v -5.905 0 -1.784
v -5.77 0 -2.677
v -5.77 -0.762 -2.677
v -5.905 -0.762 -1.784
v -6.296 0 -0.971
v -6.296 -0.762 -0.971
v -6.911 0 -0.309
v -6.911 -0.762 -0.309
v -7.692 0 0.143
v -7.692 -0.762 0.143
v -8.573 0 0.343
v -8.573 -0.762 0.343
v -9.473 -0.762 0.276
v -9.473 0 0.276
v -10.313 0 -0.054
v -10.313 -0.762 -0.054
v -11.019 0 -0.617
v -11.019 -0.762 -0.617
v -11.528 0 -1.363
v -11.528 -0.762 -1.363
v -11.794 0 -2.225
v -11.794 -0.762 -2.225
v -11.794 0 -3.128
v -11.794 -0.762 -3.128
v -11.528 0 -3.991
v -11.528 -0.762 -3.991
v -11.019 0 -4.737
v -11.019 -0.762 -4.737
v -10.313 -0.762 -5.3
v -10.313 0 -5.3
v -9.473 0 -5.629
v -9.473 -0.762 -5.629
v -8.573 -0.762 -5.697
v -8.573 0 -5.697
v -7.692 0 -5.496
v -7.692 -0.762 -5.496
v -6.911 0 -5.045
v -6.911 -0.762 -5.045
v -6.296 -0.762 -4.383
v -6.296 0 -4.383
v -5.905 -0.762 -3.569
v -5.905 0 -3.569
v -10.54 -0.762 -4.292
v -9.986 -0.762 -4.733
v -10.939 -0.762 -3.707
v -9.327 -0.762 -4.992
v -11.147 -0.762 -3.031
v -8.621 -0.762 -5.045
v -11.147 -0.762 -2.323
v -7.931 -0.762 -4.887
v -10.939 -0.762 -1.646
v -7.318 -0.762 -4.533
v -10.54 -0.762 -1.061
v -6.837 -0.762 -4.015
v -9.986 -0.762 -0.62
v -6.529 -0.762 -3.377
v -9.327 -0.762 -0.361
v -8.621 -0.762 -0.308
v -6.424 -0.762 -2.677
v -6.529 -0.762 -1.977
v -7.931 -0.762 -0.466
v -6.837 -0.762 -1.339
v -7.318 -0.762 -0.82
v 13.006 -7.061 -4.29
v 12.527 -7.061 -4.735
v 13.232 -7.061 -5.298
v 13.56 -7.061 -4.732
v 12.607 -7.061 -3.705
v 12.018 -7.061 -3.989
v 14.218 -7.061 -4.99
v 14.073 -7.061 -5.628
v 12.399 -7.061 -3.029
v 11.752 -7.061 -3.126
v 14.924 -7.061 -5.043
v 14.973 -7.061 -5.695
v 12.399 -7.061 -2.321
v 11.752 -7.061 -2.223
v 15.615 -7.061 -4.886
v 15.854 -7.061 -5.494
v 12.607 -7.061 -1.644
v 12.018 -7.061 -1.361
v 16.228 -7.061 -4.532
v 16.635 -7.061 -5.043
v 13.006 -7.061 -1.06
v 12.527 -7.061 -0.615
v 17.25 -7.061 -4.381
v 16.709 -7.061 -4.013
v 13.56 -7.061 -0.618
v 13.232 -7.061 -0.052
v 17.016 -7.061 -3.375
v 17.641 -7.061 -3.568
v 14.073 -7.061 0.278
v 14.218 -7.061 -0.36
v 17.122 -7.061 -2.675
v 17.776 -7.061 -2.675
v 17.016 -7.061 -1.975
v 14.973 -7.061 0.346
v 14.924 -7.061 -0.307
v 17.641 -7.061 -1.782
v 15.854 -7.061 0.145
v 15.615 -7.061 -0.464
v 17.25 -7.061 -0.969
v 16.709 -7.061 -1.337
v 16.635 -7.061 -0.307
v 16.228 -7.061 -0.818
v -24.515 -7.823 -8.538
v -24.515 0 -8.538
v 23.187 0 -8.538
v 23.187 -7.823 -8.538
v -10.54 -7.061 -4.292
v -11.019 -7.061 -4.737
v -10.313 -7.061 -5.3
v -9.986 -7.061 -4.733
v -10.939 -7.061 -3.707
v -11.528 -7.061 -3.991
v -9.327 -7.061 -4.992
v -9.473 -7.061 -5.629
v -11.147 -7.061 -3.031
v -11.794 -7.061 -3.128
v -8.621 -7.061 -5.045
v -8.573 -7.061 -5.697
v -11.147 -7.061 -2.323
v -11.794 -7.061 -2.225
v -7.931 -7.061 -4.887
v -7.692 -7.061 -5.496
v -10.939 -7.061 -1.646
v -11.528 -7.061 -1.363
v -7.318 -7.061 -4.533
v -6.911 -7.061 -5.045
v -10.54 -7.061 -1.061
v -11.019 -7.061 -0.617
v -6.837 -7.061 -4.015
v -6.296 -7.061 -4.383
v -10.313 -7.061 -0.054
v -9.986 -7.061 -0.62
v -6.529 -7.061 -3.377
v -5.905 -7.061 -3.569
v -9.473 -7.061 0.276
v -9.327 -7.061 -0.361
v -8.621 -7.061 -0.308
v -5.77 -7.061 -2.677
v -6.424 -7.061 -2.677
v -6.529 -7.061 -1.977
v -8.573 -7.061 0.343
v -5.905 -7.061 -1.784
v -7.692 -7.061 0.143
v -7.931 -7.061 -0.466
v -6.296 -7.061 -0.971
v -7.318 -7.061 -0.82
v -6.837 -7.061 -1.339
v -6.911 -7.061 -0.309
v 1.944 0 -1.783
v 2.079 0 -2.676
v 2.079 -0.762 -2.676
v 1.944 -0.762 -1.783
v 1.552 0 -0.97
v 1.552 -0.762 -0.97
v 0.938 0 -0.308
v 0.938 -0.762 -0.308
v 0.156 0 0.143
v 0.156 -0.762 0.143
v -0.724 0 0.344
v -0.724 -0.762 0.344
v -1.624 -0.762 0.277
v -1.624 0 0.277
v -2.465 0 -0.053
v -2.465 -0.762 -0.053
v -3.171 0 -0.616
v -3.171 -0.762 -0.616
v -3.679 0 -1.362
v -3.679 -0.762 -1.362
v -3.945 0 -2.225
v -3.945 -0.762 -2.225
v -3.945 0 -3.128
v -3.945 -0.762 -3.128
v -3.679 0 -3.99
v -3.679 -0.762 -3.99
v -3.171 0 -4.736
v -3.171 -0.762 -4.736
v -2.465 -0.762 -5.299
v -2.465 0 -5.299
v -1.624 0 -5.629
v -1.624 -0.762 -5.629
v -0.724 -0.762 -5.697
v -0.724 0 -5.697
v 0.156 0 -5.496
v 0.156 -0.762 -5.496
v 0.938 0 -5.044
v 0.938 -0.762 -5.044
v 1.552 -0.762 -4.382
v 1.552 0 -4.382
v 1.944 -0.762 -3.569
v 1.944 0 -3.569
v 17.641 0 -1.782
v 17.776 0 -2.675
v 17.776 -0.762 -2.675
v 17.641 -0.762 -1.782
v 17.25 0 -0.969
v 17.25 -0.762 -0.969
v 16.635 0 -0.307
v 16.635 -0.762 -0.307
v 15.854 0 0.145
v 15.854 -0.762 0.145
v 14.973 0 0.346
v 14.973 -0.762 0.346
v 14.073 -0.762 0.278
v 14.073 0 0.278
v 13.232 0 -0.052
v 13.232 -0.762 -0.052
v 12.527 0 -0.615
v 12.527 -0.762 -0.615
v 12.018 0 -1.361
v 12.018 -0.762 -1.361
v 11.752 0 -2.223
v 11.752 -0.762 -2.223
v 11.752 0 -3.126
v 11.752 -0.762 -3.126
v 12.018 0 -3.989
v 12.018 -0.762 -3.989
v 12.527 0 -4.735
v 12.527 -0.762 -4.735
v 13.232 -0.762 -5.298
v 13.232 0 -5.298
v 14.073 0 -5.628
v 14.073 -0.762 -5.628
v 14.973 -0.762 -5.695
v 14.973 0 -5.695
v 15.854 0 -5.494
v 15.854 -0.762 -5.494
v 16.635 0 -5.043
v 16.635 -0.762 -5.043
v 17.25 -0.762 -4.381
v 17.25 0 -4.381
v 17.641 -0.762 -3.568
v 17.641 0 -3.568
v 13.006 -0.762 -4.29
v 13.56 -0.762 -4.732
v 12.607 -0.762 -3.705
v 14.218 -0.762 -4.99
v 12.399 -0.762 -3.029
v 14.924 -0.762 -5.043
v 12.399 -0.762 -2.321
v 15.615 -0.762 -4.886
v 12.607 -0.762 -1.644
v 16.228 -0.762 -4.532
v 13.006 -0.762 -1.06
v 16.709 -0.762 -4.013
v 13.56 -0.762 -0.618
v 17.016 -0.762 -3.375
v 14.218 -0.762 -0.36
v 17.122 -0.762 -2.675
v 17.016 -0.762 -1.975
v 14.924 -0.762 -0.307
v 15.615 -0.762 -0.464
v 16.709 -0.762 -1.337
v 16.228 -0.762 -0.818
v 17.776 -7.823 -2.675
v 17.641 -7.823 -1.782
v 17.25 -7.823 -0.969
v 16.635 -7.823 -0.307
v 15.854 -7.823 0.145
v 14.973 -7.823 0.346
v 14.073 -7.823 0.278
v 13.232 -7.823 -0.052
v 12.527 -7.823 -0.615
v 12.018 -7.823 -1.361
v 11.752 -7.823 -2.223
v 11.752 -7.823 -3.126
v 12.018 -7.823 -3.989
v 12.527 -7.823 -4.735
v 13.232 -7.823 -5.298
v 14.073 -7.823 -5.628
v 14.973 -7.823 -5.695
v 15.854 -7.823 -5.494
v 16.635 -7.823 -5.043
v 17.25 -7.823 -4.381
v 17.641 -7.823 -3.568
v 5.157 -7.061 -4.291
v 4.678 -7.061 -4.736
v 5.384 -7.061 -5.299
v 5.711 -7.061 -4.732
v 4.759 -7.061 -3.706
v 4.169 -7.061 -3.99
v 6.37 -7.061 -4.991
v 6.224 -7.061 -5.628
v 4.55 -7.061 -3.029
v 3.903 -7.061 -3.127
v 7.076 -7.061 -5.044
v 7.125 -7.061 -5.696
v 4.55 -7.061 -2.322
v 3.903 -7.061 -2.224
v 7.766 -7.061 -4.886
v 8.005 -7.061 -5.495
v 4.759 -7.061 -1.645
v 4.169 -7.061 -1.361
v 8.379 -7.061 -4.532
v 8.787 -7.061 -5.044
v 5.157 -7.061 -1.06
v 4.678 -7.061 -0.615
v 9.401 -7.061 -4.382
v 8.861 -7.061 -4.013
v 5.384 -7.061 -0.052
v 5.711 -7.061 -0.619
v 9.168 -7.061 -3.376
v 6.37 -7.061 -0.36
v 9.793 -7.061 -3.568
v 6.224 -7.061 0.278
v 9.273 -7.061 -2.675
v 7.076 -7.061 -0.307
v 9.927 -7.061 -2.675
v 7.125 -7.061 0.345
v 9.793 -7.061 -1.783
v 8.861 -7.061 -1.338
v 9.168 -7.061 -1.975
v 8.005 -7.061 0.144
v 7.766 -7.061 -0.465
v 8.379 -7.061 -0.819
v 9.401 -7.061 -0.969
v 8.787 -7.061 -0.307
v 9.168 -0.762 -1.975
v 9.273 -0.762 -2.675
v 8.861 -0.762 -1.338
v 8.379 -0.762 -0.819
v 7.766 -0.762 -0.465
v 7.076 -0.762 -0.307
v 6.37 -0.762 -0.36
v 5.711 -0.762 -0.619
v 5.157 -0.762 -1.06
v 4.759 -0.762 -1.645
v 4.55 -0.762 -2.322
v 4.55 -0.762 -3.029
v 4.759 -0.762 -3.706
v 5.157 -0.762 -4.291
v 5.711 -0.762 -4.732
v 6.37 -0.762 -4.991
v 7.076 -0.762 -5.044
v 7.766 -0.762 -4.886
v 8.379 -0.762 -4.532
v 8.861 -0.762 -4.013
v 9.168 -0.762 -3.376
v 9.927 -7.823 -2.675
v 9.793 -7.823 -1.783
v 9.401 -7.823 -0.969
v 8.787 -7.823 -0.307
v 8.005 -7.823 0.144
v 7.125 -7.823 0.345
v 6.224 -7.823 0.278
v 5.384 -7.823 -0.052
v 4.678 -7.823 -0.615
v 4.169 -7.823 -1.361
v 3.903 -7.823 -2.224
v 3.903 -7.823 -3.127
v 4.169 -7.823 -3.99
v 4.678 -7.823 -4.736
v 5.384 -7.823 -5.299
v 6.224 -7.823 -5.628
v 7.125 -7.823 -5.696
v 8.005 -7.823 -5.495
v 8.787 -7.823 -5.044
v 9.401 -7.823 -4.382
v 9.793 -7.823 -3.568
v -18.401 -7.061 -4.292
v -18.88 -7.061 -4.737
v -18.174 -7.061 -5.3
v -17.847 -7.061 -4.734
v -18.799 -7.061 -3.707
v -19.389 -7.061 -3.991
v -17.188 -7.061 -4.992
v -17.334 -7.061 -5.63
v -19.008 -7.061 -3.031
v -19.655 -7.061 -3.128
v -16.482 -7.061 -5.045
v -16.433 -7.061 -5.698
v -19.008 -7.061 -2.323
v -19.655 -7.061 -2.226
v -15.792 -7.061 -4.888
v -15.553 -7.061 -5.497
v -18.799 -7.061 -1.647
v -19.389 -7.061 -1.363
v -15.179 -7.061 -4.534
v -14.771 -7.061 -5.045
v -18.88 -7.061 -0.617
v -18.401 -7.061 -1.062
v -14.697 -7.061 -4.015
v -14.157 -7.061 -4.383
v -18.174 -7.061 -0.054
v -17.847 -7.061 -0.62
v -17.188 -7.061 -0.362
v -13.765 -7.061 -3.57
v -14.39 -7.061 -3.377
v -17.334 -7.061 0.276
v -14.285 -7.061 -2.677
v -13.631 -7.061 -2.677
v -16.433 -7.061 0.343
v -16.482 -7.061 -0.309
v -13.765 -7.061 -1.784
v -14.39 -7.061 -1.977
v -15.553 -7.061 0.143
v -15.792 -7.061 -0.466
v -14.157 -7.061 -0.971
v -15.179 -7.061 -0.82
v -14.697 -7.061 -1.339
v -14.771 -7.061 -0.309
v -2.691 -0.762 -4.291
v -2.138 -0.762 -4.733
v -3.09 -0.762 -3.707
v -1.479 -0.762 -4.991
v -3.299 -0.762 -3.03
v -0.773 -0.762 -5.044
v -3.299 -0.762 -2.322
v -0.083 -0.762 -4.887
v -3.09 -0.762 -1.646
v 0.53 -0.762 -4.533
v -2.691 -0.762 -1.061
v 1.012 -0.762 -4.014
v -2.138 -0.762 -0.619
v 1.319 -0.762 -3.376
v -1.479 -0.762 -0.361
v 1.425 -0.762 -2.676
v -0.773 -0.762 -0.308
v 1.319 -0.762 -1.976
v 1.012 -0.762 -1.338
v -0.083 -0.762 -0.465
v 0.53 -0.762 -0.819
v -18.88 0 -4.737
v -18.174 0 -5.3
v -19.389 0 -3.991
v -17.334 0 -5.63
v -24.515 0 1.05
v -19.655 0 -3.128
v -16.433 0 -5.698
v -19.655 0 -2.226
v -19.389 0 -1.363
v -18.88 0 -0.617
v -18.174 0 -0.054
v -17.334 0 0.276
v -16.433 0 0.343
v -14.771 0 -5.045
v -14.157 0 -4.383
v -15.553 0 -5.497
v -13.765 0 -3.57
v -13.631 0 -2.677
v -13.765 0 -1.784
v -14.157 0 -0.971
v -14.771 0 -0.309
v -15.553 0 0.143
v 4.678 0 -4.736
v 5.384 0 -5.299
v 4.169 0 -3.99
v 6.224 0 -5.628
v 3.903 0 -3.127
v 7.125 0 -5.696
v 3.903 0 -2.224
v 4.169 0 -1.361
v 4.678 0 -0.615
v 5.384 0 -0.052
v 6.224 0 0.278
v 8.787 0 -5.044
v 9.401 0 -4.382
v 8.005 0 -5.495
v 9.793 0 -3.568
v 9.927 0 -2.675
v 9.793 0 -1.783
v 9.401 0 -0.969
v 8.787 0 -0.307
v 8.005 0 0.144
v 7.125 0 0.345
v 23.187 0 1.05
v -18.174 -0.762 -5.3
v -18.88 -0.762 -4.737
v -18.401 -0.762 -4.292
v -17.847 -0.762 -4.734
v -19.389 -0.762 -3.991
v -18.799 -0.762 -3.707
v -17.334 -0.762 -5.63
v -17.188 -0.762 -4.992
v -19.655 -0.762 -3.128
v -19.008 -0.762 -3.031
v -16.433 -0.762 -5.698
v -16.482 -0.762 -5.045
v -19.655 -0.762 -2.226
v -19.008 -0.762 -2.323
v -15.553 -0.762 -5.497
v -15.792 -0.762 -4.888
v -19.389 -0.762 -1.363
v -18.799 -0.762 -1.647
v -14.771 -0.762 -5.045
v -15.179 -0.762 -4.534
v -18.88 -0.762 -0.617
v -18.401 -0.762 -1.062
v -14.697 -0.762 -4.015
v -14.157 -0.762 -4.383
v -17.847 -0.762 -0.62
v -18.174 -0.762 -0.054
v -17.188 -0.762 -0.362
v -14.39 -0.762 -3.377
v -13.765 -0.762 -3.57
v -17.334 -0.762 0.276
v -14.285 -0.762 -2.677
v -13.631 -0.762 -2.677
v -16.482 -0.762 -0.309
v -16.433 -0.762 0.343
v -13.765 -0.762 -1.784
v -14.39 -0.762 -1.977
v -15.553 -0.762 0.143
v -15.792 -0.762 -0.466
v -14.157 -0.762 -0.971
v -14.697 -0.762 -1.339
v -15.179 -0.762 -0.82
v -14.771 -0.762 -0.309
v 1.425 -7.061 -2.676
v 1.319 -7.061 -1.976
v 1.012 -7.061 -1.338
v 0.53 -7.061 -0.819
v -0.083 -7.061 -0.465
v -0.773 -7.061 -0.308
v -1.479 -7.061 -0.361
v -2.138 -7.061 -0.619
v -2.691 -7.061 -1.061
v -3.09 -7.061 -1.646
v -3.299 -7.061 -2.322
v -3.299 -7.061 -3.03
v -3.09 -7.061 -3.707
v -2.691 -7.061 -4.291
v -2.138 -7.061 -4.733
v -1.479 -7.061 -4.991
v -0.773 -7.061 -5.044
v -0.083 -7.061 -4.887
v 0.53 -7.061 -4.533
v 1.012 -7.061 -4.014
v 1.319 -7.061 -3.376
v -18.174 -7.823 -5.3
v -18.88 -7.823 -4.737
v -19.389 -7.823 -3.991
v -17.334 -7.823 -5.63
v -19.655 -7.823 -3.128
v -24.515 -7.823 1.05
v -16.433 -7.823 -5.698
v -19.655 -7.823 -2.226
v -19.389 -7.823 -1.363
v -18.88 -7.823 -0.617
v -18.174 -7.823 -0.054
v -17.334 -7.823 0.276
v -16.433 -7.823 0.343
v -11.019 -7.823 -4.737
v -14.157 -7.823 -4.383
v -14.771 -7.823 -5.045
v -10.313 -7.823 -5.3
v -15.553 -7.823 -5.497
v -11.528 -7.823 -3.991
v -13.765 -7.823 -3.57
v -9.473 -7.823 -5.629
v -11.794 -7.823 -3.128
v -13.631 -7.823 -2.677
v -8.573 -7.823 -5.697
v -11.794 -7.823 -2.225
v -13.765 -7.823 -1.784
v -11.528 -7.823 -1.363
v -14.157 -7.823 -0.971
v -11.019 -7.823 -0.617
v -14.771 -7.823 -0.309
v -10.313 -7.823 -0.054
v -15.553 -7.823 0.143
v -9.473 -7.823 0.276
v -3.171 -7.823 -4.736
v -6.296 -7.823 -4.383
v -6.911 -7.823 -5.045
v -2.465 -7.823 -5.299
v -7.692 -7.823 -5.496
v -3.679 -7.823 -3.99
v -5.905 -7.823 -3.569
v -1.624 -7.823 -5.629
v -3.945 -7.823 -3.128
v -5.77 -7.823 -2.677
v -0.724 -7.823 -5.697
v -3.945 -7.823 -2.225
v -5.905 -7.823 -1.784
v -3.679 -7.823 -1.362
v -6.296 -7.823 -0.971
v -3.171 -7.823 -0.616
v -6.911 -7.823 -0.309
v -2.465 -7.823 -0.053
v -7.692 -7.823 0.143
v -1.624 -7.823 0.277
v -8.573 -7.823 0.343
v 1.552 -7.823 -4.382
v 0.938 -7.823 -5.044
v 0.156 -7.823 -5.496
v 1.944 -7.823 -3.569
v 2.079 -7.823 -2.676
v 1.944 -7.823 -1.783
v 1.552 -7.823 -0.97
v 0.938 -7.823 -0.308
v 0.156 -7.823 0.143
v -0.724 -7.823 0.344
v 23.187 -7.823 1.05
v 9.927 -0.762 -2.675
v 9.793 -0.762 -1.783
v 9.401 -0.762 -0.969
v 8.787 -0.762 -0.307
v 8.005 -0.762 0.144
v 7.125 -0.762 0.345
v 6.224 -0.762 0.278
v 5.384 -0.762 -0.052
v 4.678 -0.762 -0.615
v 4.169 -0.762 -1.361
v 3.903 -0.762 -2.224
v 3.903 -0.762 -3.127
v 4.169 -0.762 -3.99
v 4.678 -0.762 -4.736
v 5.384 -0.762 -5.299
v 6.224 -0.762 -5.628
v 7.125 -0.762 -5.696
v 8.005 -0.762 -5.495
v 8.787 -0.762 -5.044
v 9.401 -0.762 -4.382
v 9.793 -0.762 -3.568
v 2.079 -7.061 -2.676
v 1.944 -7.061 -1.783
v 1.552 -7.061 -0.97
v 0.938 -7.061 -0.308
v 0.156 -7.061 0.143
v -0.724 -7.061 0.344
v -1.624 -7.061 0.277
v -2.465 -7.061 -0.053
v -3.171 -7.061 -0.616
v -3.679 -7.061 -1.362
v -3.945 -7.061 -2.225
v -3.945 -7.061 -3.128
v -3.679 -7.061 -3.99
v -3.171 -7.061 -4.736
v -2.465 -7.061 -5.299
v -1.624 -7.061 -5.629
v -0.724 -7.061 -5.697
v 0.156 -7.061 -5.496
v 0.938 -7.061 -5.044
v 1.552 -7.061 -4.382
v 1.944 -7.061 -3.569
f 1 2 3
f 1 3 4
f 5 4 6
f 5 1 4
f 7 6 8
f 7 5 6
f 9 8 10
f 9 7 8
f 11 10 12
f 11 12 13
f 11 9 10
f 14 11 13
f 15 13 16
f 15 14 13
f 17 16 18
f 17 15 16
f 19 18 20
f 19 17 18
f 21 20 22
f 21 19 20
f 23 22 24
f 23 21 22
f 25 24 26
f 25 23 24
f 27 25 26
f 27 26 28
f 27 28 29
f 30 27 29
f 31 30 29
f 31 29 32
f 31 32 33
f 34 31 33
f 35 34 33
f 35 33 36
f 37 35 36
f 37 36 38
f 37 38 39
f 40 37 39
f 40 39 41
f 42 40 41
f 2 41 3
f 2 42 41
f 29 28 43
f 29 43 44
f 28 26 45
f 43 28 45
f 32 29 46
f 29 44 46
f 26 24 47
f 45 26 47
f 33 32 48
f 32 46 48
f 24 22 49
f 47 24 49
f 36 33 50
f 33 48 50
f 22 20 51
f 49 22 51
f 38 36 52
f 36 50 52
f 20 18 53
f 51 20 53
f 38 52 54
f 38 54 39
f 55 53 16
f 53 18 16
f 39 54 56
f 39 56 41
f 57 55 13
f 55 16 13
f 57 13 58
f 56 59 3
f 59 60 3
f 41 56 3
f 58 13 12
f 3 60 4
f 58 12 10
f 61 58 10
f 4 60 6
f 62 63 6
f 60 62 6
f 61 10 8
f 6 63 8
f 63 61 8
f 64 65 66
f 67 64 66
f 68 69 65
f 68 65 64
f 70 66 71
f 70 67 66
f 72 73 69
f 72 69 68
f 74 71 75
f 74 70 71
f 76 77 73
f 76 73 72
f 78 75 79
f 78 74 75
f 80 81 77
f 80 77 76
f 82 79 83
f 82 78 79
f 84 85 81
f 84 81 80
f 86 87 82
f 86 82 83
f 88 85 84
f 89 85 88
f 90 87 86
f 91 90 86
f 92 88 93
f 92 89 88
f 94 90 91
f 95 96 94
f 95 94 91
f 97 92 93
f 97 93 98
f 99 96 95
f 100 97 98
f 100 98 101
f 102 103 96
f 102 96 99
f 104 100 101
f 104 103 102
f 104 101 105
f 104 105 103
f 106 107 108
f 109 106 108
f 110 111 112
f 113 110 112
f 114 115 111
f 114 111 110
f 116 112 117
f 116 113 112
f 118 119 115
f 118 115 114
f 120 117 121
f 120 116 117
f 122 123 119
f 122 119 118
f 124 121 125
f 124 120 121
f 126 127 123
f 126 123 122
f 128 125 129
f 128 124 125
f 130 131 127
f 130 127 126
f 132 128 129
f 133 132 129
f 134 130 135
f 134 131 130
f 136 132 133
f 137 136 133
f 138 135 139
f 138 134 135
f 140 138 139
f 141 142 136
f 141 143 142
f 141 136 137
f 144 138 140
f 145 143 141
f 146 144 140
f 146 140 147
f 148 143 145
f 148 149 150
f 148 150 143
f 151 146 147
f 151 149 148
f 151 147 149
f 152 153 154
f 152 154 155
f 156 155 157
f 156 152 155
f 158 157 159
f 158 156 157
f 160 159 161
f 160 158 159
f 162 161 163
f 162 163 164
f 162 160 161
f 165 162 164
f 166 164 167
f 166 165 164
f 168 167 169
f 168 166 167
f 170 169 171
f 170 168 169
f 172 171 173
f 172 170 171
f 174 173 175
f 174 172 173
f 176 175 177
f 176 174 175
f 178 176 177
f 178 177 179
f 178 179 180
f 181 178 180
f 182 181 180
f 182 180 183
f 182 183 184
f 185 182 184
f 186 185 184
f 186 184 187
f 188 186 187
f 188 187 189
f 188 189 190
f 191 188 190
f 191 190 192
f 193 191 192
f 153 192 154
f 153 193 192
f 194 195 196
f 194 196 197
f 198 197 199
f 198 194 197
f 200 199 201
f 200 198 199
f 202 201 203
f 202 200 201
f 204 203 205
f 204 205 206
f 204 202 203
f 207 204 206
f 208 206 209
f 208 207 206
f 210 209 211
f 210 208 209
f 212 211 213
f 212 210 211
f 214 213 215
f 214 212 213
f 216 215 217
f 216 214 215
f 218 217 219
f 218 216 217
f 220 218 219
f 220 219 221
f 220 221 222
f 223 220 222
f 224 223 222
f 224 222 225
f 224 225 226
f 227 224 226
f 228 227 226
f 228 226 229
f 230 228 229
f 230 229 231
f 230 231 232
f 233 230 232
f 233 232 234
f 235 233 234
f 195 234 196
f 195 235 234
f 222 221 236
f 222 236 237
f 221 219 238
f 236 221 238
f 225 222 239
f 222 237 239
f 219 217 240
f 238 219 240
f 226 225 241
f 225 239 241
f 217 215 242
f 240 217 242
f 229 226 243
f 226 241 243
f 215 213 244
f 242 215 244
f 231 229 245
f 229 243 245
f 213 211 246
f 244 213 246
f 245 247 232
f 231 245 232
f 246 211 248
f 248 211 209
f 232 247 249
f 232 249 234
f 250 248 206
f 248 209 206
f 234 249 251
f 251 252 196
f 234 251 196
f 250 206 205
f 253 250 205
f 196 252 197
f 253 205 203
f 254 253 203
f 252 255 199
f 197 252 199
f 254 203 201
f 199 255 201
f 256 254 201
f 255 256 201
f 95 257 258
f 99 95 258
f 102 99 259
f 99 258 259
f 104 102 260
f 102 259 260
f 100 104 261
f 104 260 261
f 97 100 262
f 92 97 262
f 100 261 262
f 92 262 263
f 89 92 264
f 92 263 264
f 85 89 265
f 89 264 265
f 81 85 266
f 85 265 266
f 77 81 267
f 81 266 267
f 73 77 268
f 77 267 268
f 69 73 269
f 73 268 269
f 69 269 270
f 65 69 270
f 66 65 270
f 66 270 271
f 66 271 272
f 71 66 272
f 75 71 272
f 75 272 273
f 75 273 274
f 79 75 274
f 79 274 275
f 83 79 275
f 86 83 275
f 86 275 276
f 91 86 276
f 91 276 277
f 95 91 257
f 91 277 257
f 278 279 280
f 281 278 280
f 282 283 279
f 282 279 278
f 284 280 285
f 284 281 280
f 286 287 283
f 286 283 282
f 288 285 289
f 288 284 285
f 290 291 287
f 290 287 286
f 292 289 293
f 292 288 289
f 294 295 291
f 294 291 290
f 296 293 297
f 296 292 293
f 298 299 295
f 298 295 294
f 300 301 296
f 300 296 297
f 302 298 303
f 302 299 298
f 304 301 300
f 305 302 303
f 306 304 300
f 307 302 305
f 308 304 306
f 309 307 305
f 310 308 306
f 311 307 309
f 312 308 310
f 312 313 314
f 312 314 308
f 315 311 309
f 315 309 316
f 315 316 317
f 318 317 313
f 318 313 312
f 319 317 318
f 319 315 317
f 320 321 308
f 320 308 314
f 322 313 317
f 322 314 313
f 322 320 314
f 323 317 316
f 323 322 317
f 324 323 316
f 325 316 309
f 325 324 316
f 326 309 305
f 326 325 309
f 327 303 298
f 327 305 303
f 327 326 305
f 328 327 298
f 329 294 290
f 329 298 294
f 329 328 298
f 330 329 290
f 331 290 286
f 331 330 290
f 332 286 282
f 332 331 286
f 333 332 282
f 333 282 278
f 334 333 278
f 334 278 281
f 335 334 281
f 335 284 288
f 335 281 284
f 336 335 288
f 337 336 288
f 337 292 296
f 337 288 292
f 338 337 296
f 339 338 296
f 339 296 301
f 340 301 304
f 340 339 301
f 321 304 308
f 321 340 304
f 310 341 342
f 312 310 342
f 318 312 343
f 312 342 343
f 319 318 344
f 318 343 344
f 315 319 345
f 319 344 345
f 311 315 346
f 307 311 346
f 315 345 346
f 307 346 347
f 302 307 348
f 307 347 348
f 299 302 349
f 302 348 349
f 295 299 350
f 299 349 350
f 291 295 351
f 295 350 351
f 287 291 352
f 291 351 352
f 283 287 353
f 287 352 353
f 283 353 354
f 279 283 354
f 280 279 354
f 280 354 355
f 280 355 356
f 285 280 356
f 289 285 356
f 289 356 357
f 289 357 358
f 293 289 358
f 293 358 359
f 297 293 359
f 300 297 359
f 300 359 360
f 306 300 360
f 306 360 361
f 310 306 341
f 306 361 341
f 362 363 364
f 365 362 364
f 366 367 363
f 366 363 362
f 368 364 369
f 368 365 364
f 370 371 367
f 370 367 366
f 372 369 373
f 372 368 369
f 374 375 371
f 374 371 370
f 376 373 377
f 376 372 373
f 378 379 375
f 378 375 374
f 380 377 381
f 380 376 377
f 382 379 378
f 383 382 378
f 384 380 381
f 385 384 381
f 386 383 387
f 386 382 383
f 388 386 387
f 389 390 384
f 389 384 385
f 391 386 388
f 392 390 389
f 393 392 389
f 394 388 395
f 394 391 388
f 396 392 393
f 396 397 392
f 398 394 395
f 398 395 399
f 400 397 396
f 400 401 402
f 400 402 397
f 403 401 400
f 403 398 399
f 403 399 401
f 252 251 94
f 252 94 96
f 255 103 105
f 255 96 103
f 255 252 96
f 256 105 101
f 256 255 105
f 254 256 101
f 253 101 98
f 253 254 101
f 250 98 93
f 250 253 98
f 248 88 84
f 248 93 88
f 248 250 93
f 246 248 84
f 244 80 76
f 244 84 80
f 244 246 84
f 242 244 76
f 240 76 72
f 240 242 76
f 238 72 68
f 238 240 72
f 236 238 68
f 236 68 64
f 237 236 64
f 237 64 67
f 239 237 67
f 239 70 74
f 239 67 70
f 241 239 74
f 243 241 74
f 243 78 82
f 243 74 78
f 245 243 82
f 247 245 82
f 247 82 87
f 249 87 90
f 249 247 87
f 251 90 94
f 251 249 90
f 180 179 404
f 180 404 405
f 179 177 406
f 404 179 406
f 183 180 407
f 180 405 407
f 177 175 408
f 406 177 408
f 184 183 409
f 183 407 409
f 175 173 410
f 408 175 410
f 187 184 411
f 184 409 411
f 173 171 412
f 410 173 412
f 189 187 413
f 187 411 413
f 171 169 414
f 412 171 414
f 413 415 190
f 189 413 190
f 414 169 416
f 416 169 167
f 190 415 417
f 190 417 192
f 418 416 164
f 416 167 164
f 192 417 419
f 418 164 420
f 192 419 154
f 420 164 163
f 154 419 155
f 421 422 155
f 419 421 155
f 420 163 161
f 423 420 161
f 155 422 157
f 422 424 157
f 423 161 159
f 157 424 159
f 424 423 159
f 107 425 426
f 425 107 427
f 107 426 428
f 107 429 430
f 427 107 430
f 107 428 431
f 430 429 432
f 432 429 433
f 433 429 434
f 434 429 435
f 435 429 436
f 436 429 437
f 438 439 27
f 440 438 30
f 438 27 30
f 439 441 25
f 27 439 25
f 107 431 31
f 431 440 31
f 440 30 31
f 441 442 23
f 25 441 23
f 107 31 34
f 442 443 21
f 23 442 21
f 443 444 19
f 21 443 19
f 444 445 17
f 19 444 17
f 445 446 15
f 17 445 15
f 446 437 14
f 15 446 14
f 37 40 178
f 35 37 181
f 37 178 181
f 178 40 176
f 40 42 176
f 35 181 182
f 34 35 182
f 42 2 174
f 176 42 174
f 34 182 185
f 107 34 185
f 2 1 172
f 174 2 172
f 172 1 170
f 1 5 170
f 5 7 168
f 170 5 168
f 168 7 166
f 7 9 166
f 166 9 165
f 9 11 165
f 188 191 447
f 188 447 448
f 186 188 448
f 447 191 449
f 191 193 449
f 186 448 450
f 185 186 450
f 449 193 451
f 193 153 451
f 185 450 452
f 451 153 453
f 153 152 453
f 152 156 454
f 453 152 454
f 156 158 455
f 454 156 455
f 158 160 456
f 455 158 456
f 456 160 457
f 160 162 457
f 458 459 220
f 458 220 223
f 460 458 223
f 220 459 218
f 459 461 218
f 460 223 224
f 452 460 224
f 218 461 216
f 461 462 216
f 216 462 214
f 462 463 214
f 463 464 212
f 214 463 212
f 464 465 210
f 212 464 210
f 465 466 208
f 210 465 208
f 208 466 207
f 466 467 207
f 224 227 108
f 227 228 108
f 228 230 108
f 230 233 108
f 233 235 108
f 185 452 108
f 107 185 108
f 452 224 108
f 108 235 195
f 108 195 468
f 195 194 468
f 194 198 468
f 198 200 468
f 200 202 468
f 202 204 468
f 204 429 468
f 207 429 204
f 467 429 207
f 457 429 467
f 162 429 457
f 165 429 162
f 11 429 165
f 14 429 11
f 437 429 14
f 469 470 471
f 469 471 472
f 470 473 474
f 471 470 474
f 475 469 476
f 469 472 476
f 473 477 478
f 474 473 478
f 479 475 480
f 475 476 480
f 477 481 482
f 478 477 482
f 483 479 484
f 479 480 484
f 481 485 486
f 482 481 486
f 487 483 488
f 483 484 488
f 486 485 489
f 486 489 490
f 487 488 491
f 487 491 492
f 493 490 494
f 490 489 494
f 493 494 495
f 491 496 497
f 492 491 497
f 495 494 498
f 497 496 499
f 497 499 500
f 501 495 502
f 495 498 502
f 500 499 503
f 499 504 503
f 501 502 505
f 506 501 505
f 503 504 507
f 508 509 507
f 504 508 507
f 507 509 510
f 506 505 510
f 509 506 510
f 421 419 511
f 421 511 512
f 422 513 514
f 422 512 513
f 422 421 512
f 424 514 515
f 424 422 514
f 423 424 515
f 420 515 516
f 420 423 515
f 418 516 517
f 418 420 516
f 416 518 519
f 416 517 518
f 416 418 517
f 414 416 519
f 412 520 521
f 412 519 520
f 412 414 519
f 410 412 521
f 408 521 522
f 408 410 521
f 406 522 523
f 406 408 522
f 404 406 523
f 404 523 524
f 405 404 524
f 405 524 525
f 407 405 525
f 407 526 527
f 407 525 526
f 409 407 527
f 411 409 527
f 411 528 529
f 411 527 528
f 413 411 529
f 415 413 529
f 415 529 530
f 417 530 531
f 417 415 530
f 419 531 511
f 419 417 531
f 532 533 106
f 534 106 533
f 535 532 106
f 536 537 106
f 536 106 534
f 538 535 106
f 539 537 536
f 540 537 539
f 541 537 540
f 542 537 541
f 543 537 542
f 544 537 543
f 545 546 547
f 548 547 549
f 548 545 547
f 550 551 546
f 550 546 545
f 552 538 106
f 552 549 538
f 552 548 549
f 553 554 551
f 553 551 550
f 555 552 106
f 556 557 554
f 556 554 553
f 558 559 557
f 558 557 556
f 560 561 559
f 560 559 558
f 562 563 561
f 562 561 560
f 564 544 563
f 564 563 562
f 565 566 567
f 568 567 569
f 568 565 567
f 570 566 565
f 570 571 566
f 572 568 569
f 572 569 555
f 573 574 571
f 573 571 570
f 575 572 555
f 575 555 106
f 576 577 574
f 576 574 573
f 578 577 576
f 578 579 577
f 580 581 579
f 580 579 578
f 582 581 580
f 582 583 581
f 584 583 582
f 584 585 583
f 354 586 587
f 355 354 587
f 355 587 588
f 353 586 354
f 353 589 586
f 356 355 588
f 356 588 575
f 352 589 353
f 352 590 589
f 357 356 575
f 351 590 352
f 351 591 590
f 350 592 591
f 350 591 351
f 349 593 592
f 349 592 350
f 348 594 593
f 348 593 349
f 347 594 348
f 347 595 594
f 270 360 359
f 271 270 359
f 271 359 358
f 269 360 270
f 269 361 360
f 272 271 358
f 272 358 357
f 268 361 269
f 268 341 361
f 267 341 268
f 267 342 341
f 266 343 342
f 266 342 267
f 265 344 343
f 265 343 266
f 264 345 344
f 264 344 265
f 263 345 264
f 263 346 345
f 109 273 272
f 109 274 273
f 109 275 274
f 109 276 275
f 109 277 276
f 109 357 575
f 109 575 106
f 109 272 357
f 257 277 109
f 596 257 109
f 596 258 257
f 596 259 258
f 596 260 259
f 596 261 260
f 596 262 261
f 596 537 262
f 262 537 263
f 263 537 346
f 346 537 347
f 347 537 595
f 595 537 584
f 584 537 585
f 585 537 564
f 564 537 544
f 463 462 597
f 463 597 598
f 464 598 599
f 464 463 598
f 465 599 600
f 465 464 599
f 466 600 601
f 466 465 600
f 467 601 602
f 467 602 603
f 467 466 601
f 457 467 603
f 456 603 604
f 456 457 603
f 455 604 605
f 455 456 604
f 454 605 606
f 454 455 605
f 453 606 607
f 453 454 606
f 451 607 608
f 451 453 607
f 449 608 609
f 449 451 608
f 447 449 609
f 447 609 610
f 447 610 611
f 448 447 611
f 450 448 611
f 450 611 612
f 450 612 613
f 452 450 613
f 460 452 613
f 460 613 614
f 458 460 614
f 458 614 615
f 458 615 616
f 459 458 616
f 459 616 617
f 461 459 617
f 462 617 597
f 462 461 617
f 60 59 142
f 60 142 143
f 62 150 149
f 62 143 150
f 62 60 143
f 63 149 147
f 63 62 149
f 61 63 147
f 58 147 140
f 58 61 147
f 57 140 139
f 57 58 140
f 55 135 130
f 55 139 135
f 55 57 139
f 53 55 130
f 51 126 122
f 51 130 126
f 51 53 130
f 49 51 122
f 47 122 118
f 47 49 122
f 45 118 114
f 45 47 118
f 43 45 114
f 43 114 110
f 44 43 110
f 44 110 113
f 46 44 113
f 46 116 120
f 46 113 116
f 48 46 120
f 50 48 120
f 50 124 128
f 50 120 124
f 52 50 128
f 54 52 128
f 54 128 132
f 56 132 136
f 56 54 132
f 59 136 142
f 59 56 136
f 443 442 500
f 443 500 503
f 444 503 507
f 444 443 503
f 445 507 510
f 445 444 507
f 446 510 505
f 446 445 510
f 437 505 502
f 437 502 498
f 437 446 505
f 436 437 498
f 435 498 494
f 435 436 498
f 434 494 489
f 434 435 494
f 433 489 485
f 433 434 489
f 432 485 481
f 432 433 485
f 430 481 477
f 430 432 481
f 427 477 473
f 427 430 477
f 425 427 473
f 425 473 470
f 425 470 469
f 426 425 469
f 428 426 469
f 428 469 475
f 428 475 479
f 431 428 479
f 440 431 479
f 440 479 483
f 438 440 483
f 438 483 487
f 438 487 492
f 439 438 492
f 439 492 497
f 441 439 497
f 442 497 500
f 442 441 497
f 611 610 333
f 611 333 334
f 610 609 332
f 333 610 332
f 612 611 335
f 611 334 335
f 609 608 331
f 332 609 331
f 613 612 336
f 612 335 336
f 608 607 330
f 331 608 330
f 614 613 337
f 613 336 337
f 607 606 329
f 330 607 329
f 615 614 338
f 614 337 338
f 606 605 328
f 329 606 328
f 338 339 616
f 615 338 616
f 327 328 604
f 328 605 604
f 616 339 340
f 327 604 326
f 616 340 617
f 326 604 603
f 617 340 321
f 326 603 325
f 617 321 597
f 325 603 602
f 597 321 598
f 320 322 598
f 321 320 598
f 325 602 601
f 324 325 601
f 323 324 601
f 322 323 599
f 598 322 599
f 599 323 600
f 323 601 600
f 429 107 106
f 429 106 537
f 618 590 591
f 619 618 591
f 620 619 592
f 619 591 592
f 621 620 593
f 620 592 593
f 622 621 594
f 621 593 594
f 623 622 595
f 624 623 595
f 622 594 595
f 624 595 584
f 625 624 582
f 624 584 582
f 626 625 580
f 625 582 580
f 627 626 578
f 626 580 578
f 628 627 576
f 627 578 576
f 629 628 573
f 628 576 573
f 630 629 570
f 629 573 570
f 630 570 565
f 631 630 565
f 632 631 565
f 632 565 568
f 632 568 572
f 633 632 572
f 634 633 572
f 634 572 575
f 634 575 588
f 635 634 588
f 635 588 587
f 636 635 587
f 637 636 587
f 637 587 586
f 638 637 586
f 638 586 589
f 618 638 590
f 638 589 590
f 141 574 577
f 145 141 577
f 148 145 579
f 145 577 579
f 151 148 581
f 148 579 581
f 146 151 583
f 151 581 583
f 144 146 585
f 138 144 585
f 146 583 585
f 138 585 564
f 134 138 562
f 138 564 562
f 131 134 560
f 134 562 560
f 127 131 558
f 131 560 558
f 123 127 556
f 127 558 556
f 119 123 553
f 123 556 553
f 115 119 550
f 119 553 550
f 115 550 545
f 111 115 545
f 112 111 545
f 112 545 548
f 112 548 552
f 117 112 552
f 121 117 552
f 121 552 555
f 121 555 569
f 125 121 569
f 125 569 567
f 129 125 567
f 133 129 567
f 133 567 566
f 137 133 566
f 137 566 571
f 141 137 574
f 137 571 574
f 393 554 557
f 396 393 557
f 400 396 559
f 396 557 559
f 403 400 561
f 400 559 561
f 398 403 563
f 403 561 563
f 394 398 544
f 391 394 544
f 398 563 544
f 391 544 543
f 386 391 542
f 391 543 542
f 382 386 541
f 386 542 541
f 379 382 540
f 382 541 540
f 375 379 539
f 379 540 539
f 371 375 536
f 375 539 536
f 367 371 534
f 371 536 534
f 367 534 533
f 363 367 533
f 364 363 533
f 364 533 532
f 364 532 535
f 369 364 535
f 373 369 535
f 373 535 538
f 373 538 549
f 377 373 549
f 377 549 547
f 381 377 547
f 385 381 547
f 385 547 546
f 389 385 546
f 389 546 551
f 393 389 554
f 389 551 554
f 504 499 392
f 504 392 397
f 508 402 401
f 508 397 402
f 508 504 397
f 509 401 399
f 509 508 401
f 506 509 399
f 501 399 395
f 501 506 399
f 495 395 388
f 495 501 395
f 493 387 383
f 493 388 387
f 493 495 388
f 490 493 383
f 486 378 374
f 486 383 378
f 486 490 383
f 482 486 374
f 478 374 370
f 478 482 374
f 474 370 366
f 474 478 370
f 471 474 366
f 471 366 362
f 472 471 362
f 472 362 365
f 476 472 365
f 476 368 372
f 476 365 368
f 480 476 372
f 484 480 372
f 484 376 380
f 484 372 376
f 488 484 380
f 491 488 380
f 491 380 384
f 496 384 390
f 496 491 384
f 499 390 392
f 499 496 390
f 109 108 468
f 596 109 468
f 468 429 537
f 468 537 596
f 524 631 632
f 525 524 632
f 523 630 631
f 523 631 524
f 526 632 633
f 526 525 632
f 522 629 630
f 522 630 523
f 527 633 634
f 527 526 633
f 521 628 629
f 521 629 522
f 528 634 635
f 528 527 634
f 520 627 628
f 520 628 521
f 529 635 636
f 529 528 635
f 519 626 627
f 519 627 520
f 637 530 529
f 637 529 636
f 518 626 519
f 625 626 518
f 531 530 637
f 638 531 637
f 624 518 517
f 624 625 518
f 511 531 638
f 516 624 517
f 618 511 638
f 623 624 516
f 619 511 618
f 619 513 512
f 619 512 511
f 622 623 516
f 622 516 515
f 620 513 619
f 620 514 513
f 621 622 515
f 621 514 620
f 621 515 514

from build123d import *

# Parameters (mm, degrees)
F0_W     = 47.7012
F0_H     = 9.5885
F1_DEPTH = 7.8232
F3_R     = 2.3749
F4_DEPTH = 8.12476
F5_R     = 3.02895
F5_R_2   = 3.028652
F6_DEPTH = 0.762
F7_R     = 3.02895
F7_R_2   = 3.028652
F8_DEPTH = 0.762


with BuildPart() as f1:
    # F0 (on Front) → F1 (new body)
    with BuildSketch(Plane.XZ):
        with Locations((-0.66396, -3.743826)):
            Rectangle(F0_W, F0_H)
    extrude(amount=F1_DEPTH)

    # F3 (on Front) → F4 (cut)
    with BuildSketch(Plane.XZ):
        with Locations((14.746952, -2.674865)):
            Circle(F3_R)
        with Locations((6.898352, -2.675486)):
            Circle(F3_R)
        with Locations((-0.950248, -2.676107)):
            Circle(F3_R)
        with Locations((-8.798848, -2.676728)):
            Circle(F3_R)
        with Locations((-16.65961, -2.677026)):
            Circle(F3_R)
    extrude(amount=F4_DEPTH, mode=Mode.SUBTRACT)

    # F5 (on Front) → F6 (cut)
    with BuildSketch(Plane.XZ):
        with Locations((14.746952, -2.674865)):
            Circle(F5_R)
        with Locations((6.898352, -2.675486)):
            Circle(F5_R)
        with Locations((-0.950248, -2.676107)):
            Circle(F5_R)
        with Locations((-8.798848, -2.676728)):
            Circle(F5_R_2)
        with Locations((-16.65961, -2.677026)):
            Circle(F5_R)
    extrude(amount=F6_DEPTH, mode=Mode.SUBTRACT)

    # F7 (on face) → F8 (cut)
    with BuildSketch(Plane.XZ.offset(7.8232)):
        with Locations((14.746952, -2.674865)):
            Circle(F7_R)
        with Locations((6.898352, -2.675486)):
            Circle(F7_R)
        with Locations((-0.950248, -2.676107)):
            Circle(F7_R)
        with Locations((-8.798848, -2.676728)):
            Circle(F7_R_2)
        with Locations((-16.65961, -2.677026)):
            Circle(F7_R)
    extrude(amount=-F8_DEPTH, mode=Mode.SUBTRACT)


solid = f1.part
